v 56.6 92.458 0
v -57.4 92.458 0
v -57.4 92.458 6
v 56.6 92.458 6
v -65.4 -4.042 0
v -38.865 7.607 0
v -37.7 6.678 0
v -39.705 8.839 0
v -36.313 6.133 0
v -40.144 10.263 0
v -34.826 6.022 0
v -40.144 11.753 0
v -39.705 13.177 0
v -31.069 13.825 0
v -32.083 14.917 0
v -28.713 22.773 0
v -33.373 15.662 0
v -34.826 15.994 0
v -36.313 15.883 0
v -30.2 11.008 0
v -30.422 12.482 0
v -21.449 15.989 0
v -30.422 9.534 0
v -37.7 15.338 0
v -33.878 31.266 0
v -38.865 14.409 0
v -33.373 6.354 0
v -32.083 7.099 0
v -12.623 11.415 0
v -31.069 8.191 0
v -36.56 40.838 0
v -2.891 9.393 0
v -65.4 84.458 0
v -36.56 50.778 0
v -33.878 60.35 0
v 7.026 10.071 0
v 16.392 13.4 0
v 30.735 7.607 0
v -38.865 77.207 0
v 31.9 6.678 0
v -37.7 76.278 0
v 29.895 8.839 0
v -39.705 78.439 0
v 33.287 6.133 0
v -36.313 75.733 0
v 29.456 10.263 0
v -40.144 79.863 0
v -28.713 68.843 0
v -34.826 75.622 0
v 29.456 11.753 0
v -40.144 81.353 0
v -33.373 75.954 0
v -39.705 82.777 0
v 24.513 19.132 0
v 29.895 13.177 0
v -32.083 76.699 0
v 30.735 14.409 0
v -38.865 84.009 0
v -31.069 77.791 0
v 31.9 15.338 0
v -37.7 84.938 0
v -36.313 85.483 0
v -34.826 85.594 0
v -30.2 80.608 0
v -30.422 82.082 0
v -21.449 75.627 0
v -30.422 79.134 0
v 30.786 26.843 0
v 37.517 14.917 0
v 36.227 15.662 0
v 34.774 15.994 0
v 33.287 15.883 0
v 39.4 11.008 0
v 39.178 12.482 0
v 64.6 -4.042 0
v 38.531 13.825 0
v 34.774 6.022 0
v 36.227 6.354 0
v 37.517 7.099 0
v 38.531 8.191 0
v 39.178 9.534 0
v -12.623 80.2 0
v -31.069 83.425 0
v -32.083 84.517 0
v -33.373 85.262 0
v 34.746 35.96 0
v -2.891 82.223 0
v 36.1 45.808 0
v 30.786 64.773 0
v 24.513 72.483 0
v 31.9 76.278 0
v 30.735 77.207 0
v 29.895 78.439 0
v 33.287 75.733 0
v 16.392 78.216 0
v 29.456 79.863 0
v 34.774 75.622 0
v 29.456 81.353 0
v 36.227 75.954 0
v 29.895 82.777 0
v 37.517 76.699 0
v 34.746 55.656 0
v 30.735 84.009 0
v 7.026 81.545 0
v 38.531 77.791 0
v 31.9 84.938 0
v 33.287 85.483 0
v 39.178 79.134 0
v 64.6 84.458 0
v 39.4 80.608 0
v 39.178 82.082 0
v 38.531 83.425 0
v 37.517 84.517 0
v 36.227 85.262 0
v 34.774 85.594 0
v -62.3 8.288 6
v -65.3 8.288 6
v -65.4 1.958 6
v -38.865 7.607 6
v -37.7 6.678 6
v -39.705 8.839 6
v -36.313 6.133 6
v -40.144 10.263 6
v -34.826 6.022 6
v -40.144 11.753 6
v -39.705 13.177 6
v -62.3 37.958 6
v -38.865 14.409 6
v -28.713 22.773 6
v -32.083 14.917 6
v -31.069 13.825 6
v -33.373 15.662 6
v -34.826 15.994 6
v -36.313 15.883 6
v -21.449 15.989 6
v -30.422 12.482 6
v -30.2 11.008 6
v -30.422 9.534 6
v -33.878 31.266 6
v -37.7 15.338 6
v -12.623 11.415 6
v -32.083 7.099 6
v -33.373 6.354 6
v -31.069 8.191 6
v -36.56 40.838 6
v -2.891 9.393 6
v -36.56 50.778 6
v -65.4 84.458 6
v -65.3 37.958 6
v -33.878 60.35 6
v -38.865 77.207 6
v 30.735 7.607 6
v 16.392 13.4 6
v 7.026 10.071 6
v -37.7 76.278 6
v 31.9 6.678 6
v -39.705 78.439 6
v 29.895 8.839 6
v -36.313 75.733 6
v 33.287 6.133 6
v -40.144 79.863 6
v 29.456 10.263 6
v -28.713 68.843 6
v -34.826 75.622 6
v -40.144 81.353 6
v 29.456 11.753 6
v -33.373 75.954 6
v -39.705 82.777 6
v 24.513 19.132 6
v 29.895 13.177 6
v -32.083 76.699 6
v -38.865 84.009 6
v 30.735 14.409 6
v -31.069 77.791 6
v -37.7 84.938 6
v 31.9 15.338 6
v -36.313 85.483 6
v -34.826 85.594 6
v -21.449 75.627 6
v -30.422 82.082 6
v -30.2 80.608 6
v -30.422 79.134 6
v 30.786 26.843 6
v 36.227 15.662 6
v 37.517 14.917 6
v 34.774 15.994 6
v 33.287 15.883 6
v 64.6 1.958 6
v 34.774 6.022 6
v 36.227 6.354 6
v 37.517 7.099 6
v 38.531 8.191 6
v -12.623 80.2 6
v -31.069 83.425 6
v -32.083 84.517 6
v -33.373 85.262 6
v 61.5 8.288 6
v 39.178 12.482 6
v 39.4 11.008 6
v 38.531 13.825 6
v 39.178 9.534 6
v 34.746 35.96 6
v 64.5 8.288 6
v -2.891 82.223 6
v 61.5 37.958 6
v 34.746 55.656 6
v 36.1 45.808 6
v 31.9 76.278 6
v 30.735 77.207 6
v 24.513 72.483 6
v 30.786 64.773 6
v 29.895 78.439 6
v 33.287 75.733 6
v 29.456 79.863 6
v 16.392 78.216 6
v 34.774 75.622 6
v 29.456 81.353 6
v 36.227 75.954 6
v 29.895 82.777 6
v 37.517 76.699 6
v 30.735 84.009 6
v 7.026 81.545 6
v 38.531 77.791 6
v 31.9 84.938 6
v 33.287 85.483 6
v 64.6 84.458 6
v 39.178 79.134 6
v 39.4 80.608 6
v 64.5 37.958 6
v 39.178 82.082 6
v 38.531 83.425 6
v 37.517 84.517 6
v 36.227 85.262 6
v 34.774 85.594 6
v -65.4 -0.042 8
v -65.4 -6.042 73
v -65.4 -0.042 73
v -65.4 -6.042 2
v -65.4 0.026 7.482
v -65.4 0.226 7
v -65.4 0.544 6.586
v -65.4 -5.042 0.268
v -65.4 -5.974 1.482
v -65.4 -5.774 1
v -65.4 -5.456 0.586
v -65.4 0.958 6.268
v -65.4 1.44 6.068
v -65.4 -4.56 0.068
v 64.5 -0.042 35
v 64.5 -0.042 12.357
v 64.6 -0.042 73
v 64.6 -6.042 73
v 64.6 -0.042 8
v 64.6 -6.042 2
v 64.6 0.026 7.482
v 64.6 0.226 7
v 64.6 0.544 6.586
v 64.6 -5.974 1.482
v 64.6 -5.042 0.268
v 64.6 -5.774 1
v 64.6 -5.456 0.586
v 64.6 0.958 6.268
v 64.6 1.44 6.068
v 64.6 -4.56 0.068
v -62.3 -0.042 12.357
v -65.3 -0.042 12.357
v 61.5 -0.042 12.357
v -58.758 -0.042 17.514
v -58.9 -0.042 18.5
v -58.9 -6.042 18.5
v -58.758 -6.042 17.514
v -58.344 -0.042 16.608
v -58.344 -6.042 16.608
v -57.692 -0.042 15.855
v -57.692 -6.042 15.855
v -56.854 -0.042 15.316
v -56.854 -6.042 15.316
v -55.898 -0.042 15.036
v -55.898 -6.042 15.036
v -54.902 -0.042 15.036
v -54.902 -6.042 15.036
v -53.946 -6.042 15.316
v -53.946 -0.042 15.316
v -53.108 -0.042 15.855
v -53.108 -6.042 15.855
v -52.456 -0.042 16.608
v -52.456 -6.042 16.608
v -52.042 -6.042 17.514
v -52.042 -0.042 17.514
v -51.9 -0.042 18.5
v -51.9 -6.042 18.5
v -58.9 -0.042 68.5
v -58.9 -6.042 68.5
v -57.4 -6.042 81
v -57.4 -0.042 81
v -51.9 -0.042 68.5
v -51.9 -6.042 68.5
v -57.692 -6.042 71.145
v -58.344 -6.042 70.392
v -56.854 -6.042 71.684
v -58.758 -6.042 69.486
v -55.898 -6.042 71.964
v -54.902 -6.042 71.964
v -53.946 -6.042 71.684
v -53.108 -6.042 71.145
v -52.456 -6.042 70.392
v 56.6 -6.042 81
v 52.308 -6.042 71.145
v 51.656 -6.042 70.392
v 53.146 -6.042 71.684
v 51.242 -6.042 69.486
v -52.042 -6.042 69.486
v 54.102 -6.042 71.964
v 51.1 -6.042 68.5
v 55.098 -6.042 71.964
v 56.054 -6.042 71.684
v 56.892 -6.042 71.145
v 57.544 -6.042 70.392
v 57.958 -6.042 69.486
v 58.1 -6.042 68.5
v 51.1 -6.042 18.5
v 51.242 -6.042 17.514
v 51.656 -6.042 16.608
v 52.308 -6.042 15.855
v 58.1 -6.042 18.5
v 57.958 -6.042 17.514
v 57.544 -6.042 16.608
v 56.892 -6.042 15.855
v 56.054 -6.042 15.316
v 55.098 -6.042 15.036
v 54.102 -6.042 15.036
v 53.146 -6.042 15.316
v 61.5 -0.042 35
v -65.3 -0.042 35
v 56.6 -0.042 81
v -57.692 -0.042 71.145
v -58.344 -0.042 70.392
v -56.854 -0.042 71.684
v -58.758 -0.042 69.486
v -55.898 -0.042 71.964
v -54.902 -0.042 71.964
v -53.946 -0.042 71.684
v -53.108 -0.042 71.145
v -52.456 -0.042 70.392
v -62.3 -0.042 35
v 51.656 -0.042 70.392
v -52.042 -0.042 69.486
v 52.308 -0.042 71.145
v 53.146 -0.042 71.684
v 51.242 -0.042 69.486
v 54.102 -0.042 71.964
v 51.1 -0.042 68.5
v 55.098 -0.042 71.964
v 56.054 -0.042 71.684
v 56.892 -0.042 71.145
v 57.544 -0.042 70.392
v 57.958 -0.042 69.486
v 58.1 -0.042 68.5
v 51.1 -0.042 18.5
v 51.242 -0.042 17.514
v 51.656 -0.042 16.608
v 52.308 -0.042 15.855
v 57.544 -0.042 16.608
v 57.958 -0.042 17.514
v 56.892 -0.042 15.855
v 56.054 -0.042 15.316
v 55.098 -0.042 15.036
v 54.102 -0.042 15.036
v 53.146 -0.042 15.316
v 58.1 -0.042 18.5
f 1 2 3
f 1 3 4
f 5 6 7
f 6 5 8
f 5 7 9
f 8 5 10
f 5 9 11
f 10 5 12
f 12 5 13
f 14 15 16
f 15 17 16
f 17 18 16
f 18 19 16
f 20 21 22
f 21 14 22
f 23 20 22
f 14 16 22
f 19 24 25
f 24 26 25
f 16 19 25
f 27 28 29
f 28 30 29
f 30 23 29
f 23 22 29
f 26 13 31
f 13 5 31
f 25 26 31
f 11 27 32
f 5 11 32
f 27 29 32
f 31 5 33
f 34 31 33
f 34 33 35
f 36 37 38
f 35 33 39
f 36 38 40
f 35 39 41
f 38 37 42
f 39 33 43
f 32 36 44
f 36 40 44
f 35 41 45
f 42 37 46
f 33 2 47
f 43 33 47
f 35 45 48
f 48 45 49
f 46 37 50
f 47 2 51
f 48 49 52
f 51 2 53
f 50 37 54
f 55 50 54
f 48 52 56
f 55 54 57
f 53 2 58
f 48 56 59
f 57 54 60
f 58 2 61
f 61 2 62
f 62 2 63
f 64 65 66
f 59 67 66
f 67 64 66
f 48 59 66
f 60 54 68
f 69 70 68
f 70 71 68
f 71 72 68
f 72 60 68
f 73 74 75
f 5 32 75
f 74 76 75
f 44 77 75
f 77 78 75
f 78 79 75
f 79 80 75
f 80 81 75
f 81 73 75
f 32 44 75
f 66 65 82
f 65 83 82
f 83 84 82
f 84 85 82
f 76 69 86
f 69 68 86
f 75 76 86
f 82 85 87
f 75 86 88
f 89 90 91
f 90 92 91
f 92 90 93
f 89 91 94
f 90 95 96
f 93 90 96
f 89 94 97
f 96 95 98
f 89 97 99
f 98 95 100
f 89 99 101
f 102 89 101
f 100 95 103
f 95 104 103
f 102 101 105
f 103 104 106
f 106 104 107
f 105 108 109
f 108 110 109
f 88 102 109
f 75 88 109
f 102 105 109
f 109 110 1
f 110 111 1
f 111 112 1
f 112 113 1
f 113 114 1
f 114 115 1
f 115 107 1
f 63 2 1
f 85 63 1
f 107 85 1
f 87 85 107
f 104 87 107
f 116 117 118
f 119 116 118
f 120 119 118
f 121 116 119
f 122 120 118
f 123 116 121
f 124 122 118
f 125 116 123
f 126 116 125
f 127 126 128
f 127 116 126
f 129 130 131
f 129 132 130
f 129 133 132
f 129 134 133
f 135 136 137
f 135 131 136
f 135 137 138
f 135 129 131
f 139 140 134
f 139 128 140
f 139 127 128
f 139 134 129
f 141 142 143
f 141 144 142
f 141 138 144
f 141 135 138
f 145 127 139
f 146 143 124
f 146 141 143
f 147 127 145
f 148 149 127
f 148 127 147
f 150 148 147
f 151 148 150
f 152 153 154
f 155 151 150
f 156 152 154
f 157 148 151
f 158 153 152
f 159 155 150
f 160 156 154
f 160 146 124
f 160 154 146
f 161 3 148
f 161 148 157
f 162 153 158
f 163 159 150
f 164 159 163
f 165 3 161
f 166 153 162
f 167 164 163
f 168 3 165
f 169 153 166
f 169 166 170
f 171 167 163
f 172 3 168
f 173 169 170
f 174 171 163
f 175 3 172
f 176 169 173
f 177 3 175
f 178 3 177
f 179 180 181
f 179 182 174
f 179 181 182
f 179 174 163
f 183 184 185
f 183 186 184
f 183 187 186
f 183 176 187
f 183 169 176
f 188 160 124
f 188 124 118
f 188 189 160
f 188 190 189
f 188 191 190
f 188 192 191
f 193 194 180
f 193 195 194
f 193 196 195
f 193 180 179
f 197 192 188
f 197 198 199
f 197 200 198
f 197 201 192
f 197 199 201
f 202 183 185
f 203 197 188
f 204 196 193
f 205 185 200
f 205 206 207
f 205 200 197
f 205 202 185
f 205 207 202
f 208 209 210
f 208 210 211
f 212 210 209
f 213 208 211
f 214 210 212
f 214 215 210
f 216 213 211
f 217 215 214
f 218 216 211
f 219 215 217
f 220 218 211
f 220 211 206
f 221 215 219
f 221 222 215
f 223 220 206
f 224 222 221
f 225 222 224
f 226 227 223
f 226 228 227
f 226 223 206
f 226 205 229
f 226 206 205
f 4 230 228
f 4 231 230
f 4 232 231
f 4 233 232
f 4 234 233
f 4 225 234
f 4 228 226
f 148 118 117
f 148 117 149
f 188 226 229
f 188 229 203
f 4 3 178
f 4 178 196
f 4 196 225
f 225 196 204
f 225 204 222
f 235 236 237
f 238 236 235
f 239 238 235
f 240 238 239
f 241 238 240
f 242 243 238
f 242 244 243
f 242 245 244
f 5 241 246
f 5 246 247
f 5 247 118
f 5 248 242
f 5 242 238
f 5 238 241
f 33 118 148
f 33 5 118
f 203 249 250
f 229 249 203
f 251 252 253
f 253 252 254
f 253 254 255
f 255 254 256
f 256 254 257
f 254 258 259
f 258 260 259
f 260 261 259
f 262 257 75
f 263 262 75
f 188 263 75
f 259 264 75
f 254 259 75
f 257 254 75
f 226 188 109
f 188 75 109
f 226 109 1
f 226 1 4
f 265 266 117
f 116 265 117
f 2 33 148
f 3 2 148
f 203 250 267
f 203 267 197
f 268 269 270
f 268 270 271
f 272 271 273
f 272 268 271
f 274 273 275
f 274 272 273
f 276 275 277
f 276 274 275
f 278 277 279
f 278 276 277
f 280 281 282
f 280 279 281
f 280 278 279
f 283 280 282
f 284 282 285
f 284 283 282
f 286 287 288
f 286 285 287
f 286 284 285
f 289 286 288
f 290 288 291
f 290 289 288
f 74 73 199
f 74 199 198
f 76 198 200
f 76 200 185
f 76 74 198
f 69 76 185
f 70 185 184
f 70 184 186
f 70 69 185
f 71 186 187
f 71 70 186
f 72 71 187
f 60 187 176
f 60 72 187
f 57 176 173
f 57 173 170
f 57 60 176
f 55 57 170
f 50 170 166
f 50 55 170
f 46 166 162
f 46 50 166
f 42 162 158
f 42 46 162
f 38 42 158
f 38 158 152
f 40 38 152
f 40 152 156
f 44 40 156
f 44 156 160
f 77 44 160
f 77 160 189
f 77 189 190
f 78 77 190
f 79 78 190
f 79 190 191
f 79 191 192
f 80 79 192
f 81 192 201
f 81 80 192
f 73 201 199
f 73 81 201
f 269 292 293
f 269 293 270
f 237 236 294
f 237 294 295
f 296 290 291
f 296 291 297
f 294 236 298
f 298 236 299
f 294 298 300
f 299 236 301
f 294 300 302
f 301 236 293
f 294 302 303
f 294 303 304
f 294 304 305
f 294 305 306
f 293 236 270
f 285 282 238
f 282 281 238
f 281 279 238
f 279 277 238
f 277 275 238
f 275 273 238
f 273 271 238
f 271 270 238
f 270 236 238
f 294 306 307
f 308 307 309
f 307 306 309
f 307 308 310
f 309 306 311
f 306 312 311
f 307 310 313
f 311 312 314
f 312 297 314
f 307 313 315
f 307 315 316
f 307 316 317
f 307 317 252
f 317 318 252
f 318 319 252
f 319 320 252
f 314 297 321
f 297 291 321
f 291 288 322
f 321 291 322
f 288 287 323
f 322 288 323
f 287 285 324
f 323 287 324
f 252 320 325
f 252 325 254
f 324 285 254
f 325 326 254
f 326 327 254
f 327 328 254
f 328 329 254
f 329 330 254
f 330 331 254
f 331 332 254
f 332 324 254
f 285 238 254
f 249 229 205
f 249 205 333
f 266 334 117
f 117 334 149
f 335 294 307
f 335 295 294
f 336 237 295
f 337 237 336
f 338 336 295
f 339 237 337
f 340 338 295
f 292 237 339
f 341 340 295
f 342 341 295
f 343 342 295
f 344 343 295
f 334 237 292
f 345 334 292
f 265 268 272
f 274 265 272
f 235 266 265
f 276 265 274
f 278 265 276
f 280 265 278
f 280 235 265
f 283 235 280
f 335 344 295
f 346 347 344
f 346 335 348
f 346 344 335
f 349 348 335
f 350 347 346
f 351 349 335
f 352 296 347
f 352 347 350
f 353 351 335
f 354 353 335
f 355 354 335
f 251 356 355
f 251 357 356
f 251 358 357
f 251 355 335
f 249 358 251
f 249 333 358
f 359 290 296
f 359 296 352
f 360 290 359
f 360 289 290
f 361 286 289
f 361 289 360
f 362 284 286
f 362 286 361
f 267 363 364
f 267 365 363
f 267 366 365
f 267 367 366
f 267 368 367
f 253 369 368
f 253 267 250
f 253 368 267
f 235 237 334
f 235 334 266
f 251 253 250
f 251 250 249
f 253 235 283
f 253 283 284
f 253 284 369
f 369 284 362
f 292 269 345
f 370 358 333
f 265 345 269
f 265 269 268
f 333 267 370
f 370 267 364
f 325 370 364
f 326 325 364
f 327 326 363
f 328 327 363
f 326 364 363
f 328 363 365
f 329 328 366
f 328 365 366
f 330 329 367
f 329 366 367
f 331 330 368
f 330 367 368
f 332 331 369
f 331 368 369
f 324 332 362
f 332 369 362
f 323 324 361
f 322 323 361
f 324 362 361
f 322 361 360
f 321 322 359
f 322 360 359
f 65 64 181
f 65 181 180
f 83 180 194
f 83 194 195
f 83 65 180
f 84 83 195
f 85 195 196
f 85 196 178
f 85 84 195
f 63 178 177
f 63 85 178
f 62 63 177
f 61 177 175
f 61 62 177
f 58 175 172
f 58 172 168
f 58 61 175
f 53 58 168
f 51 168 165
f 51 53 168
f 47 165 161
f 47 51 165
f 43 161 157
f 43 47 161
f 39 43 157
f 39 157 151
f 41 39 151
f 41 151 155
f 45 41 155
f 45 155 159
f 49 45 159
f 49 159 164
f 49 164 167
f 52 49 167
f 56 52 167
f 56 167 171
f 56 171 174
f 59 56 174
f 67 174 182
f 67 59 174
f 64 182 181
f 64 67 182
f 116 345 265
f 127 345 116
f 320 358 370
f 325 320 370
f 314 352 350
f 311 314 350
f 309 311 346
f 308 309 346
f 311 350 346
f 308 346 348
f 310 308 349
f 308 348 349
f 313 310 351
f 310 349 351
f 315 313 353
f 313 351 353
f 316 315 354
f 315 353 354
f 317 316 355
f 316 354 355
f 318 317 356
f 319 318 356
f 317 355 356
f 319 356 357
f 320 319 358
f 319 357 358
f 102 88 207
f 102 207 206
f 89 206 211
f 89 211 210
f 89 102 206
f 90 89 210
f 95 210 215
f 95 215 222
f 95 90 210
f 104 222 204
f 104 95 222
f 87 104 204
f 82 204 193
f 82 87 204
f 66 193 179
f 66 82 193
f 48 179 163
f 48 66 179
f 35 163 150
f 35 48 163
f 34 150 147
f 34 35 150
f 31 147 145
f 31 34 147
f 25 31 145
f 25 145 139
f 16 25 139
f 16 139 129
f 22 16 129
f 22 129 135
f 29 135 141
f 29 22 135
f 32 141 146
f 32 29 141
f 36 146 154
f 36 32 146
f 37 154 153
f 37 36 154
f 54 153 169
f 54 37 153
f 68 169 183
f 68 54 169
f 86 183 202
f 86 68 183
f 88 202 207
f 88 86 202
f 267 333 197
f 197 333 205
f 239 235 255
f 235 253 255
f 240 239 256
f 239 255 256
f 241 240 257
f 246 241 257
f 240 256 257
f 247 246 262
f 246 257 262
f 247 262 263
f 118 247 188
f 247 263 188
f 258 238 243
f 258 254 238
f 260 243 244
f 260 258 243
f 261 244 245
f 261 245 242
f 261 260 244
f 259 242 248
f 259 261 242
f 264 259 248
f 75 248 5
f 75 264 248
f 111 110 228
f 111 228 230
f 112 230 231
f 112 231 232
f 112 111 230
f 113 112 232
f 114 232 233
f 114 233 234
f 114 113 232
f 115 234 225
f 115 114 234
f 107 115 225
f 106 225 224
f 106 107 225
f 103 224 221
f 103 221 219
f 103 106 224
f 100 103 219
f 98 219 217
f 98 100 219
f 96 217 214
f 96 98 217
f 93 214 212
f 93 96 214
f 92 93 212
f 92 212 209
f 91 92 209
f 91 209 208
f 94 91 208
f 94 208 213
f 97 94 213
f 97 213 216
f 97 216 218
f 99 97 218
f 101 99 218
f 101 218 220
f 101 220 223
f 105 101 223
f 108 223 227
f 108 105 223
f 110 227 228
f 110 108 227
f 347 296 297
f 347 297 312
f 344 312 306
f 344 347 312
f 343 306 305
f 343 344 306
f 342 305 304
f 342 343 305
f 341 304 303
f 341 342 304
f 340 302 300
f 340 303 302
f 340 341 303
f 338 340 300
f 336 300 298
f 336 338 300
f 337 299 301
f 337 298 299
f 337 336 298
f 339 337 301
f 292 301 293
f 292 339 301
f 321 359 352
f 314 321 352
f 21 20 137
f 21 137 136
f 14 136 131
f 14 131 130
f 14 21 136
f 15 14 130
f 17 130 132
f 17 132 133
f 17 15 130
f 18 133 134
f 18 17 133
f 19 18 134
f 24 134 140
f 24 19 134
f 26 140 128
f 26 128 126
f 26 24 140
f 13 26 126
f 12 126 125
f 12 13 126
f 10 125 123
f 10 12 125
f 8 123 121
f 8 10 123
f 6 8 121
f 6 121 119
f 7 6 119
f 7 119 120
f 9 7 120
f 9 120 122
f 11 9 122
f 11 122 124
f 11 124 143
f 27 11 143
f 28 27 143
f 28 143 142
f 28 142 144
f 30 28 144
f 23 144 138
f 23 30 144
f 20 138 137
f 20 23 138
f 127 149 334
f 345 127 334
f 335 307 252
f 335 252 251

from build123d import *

# Parameters (mm, degrees)
SKETCH1_W           = 130
SKETCH1_H           = 98.5
SKETCH1_R           = 36.5
SKETCH1_R_2         = 5
BOSS_EXTRUDE1_DEPTH = 6
SKETCH2_W           = 130
SKETCH2_H           = 6
BOSS_EXTRUDE2_DEPTH = 75
CHAMFER1_SIZE       = 8
CUT_EXTRUDE1_DEPTH  = 7
BOSS_EXTRUDE3_START = -0.1
BOSS_EXTRUDE3_DEPTH = 3
BOSS_EXTRUDE4_START = -0.1
BOSS_EXTRUDE4_DEPTH = 3
FILLET1_R           = 2


with BuildPart() as part:
    # Sketch1 → Boss-Extrude1 (new body)
    with BuildSketch(Plane.XY):
        with Locations((-0.4, 43.207953426)):
            Rectangle(SKETCH1_W, SKETCH1_H)
        with Locations((-0.4, 45.807953426)):
            Circle(SKETCH1_R, mode=Mode.SUBTRACT)
        with Locations((-35.2, 80.607953426)):
            Circle(SKETCH1_R_2, mode=Mode.SUBTRACT)
        with Locations((34.4, 80.607953426)):
            Circle(SKETCH1_R_2, mode=Mode.SUBTRACT)
        with Locations((34.4, 11.007953426)):
            Circle(SKETCH1_R_2, mode=Mode.SUBTRACT)
        with Locations((-35.2, 11.007953426)):
            Circle(SKETCH1_R_2, mode=Mode.SUBTRACT)
    extrude(amount=BOSS_EXTRUDE1_DEPTH)

    # Sketch2 → Boss-Extrude2 (add)
    with BuildSketch(Plane.XY.offset(6)):
        with Locations((-0.4, -3.042046574)):
            Rectangle(SKETCH2_W, SKETCH2_H)
    extrude(amount=BOSS_EXTRUDE2_DEPTH)

    # Chamfer1
    chamfer1_edges = [part.edges().sort_by_distance(p)[0] for p in [
        (-65.4, -3.042046574, 81),
        (64.6, -3.042046574, 81),
        (-65.4, 92.457953426, 3),
        (64.6, 92.457953426, 3),
    ]]
    chamfer(chamfer1_edges, length=CHAMFER1_SIZE)

    # Sketch3 → Cut-Extrude1 (cut, through all)
    with BuildSketch(Plane(origin=(0, -0.042046574, 0), x_dir=(1, 0, 0), z_dir=(0, 1, 0))):
        with BuildLine():
            Line((-58.9, -68.5), (-58.9, -18.5))
            ThreePointArc((-58.9, -18.5), (-55.4, -15), (-51.9, -18.5))
            Line((-51.9, -18.5), (-51.9, -68.5))
            ThreePointArc((-51.9, -68.5), (-55.4, -72), (-58.9, -68.5))
        make_face()
        with BuildLine():
            Line((58.1, -68.5), (58.1, -18.5))
            ThreePointArc((58.1, -18.5), (54.6, -15), (51.1, -18.5))
            Line((51.1, -18.5), (51.1, -68.5))
            ThreePointArc((51.1, -68.5), (54.6, -72), (58.1, -68.5))
        make_face()
    extrude(amount=-CUT_EXTRUDE1_DEPTH, mode=Mode.SUBTRACT)

    # Sketch4 → Boss-Extrude3 (add)
    with BuildSketch(Plane.ZY.offset(65.4).offset(BOSS_EXTRUDE3_START)):
        Polygon((6, 37.957953426), (35, -0.042046574), (12.357101974, -0.042046574), (6, 8.287949116), align=None)
    extrude(amount=-BOSS_EXTRUDE3_DEPTH)

    # Sketch5 → Boss-Extrude4 (add)
    with BuildSketch(Plane(origin=(64.6, 0, 0), x_dir=(0, 0, -1), z_dir=(1, 0, 0)).offset(BOSS_EXTRUDE4_START)):
        Polygon((-6, 8.287949116), (-6, 37.957953426), (-35, -0.042046574), (-12.357101974, -0.042046574), align=None)
    extrude(amount=-BOSS_EXTRUDE4_DEPTH)

    # Fillet1
    fillet1_edges = [part.edges().sort_by_distance(p)[0] for p in [
        (-0.4, -0.042046574, 6),
        (-0.4, -6.042046574, 0),
    ]]
    fillet(fillet1_edges, radius=FILLET1_R)


solid = part.part
